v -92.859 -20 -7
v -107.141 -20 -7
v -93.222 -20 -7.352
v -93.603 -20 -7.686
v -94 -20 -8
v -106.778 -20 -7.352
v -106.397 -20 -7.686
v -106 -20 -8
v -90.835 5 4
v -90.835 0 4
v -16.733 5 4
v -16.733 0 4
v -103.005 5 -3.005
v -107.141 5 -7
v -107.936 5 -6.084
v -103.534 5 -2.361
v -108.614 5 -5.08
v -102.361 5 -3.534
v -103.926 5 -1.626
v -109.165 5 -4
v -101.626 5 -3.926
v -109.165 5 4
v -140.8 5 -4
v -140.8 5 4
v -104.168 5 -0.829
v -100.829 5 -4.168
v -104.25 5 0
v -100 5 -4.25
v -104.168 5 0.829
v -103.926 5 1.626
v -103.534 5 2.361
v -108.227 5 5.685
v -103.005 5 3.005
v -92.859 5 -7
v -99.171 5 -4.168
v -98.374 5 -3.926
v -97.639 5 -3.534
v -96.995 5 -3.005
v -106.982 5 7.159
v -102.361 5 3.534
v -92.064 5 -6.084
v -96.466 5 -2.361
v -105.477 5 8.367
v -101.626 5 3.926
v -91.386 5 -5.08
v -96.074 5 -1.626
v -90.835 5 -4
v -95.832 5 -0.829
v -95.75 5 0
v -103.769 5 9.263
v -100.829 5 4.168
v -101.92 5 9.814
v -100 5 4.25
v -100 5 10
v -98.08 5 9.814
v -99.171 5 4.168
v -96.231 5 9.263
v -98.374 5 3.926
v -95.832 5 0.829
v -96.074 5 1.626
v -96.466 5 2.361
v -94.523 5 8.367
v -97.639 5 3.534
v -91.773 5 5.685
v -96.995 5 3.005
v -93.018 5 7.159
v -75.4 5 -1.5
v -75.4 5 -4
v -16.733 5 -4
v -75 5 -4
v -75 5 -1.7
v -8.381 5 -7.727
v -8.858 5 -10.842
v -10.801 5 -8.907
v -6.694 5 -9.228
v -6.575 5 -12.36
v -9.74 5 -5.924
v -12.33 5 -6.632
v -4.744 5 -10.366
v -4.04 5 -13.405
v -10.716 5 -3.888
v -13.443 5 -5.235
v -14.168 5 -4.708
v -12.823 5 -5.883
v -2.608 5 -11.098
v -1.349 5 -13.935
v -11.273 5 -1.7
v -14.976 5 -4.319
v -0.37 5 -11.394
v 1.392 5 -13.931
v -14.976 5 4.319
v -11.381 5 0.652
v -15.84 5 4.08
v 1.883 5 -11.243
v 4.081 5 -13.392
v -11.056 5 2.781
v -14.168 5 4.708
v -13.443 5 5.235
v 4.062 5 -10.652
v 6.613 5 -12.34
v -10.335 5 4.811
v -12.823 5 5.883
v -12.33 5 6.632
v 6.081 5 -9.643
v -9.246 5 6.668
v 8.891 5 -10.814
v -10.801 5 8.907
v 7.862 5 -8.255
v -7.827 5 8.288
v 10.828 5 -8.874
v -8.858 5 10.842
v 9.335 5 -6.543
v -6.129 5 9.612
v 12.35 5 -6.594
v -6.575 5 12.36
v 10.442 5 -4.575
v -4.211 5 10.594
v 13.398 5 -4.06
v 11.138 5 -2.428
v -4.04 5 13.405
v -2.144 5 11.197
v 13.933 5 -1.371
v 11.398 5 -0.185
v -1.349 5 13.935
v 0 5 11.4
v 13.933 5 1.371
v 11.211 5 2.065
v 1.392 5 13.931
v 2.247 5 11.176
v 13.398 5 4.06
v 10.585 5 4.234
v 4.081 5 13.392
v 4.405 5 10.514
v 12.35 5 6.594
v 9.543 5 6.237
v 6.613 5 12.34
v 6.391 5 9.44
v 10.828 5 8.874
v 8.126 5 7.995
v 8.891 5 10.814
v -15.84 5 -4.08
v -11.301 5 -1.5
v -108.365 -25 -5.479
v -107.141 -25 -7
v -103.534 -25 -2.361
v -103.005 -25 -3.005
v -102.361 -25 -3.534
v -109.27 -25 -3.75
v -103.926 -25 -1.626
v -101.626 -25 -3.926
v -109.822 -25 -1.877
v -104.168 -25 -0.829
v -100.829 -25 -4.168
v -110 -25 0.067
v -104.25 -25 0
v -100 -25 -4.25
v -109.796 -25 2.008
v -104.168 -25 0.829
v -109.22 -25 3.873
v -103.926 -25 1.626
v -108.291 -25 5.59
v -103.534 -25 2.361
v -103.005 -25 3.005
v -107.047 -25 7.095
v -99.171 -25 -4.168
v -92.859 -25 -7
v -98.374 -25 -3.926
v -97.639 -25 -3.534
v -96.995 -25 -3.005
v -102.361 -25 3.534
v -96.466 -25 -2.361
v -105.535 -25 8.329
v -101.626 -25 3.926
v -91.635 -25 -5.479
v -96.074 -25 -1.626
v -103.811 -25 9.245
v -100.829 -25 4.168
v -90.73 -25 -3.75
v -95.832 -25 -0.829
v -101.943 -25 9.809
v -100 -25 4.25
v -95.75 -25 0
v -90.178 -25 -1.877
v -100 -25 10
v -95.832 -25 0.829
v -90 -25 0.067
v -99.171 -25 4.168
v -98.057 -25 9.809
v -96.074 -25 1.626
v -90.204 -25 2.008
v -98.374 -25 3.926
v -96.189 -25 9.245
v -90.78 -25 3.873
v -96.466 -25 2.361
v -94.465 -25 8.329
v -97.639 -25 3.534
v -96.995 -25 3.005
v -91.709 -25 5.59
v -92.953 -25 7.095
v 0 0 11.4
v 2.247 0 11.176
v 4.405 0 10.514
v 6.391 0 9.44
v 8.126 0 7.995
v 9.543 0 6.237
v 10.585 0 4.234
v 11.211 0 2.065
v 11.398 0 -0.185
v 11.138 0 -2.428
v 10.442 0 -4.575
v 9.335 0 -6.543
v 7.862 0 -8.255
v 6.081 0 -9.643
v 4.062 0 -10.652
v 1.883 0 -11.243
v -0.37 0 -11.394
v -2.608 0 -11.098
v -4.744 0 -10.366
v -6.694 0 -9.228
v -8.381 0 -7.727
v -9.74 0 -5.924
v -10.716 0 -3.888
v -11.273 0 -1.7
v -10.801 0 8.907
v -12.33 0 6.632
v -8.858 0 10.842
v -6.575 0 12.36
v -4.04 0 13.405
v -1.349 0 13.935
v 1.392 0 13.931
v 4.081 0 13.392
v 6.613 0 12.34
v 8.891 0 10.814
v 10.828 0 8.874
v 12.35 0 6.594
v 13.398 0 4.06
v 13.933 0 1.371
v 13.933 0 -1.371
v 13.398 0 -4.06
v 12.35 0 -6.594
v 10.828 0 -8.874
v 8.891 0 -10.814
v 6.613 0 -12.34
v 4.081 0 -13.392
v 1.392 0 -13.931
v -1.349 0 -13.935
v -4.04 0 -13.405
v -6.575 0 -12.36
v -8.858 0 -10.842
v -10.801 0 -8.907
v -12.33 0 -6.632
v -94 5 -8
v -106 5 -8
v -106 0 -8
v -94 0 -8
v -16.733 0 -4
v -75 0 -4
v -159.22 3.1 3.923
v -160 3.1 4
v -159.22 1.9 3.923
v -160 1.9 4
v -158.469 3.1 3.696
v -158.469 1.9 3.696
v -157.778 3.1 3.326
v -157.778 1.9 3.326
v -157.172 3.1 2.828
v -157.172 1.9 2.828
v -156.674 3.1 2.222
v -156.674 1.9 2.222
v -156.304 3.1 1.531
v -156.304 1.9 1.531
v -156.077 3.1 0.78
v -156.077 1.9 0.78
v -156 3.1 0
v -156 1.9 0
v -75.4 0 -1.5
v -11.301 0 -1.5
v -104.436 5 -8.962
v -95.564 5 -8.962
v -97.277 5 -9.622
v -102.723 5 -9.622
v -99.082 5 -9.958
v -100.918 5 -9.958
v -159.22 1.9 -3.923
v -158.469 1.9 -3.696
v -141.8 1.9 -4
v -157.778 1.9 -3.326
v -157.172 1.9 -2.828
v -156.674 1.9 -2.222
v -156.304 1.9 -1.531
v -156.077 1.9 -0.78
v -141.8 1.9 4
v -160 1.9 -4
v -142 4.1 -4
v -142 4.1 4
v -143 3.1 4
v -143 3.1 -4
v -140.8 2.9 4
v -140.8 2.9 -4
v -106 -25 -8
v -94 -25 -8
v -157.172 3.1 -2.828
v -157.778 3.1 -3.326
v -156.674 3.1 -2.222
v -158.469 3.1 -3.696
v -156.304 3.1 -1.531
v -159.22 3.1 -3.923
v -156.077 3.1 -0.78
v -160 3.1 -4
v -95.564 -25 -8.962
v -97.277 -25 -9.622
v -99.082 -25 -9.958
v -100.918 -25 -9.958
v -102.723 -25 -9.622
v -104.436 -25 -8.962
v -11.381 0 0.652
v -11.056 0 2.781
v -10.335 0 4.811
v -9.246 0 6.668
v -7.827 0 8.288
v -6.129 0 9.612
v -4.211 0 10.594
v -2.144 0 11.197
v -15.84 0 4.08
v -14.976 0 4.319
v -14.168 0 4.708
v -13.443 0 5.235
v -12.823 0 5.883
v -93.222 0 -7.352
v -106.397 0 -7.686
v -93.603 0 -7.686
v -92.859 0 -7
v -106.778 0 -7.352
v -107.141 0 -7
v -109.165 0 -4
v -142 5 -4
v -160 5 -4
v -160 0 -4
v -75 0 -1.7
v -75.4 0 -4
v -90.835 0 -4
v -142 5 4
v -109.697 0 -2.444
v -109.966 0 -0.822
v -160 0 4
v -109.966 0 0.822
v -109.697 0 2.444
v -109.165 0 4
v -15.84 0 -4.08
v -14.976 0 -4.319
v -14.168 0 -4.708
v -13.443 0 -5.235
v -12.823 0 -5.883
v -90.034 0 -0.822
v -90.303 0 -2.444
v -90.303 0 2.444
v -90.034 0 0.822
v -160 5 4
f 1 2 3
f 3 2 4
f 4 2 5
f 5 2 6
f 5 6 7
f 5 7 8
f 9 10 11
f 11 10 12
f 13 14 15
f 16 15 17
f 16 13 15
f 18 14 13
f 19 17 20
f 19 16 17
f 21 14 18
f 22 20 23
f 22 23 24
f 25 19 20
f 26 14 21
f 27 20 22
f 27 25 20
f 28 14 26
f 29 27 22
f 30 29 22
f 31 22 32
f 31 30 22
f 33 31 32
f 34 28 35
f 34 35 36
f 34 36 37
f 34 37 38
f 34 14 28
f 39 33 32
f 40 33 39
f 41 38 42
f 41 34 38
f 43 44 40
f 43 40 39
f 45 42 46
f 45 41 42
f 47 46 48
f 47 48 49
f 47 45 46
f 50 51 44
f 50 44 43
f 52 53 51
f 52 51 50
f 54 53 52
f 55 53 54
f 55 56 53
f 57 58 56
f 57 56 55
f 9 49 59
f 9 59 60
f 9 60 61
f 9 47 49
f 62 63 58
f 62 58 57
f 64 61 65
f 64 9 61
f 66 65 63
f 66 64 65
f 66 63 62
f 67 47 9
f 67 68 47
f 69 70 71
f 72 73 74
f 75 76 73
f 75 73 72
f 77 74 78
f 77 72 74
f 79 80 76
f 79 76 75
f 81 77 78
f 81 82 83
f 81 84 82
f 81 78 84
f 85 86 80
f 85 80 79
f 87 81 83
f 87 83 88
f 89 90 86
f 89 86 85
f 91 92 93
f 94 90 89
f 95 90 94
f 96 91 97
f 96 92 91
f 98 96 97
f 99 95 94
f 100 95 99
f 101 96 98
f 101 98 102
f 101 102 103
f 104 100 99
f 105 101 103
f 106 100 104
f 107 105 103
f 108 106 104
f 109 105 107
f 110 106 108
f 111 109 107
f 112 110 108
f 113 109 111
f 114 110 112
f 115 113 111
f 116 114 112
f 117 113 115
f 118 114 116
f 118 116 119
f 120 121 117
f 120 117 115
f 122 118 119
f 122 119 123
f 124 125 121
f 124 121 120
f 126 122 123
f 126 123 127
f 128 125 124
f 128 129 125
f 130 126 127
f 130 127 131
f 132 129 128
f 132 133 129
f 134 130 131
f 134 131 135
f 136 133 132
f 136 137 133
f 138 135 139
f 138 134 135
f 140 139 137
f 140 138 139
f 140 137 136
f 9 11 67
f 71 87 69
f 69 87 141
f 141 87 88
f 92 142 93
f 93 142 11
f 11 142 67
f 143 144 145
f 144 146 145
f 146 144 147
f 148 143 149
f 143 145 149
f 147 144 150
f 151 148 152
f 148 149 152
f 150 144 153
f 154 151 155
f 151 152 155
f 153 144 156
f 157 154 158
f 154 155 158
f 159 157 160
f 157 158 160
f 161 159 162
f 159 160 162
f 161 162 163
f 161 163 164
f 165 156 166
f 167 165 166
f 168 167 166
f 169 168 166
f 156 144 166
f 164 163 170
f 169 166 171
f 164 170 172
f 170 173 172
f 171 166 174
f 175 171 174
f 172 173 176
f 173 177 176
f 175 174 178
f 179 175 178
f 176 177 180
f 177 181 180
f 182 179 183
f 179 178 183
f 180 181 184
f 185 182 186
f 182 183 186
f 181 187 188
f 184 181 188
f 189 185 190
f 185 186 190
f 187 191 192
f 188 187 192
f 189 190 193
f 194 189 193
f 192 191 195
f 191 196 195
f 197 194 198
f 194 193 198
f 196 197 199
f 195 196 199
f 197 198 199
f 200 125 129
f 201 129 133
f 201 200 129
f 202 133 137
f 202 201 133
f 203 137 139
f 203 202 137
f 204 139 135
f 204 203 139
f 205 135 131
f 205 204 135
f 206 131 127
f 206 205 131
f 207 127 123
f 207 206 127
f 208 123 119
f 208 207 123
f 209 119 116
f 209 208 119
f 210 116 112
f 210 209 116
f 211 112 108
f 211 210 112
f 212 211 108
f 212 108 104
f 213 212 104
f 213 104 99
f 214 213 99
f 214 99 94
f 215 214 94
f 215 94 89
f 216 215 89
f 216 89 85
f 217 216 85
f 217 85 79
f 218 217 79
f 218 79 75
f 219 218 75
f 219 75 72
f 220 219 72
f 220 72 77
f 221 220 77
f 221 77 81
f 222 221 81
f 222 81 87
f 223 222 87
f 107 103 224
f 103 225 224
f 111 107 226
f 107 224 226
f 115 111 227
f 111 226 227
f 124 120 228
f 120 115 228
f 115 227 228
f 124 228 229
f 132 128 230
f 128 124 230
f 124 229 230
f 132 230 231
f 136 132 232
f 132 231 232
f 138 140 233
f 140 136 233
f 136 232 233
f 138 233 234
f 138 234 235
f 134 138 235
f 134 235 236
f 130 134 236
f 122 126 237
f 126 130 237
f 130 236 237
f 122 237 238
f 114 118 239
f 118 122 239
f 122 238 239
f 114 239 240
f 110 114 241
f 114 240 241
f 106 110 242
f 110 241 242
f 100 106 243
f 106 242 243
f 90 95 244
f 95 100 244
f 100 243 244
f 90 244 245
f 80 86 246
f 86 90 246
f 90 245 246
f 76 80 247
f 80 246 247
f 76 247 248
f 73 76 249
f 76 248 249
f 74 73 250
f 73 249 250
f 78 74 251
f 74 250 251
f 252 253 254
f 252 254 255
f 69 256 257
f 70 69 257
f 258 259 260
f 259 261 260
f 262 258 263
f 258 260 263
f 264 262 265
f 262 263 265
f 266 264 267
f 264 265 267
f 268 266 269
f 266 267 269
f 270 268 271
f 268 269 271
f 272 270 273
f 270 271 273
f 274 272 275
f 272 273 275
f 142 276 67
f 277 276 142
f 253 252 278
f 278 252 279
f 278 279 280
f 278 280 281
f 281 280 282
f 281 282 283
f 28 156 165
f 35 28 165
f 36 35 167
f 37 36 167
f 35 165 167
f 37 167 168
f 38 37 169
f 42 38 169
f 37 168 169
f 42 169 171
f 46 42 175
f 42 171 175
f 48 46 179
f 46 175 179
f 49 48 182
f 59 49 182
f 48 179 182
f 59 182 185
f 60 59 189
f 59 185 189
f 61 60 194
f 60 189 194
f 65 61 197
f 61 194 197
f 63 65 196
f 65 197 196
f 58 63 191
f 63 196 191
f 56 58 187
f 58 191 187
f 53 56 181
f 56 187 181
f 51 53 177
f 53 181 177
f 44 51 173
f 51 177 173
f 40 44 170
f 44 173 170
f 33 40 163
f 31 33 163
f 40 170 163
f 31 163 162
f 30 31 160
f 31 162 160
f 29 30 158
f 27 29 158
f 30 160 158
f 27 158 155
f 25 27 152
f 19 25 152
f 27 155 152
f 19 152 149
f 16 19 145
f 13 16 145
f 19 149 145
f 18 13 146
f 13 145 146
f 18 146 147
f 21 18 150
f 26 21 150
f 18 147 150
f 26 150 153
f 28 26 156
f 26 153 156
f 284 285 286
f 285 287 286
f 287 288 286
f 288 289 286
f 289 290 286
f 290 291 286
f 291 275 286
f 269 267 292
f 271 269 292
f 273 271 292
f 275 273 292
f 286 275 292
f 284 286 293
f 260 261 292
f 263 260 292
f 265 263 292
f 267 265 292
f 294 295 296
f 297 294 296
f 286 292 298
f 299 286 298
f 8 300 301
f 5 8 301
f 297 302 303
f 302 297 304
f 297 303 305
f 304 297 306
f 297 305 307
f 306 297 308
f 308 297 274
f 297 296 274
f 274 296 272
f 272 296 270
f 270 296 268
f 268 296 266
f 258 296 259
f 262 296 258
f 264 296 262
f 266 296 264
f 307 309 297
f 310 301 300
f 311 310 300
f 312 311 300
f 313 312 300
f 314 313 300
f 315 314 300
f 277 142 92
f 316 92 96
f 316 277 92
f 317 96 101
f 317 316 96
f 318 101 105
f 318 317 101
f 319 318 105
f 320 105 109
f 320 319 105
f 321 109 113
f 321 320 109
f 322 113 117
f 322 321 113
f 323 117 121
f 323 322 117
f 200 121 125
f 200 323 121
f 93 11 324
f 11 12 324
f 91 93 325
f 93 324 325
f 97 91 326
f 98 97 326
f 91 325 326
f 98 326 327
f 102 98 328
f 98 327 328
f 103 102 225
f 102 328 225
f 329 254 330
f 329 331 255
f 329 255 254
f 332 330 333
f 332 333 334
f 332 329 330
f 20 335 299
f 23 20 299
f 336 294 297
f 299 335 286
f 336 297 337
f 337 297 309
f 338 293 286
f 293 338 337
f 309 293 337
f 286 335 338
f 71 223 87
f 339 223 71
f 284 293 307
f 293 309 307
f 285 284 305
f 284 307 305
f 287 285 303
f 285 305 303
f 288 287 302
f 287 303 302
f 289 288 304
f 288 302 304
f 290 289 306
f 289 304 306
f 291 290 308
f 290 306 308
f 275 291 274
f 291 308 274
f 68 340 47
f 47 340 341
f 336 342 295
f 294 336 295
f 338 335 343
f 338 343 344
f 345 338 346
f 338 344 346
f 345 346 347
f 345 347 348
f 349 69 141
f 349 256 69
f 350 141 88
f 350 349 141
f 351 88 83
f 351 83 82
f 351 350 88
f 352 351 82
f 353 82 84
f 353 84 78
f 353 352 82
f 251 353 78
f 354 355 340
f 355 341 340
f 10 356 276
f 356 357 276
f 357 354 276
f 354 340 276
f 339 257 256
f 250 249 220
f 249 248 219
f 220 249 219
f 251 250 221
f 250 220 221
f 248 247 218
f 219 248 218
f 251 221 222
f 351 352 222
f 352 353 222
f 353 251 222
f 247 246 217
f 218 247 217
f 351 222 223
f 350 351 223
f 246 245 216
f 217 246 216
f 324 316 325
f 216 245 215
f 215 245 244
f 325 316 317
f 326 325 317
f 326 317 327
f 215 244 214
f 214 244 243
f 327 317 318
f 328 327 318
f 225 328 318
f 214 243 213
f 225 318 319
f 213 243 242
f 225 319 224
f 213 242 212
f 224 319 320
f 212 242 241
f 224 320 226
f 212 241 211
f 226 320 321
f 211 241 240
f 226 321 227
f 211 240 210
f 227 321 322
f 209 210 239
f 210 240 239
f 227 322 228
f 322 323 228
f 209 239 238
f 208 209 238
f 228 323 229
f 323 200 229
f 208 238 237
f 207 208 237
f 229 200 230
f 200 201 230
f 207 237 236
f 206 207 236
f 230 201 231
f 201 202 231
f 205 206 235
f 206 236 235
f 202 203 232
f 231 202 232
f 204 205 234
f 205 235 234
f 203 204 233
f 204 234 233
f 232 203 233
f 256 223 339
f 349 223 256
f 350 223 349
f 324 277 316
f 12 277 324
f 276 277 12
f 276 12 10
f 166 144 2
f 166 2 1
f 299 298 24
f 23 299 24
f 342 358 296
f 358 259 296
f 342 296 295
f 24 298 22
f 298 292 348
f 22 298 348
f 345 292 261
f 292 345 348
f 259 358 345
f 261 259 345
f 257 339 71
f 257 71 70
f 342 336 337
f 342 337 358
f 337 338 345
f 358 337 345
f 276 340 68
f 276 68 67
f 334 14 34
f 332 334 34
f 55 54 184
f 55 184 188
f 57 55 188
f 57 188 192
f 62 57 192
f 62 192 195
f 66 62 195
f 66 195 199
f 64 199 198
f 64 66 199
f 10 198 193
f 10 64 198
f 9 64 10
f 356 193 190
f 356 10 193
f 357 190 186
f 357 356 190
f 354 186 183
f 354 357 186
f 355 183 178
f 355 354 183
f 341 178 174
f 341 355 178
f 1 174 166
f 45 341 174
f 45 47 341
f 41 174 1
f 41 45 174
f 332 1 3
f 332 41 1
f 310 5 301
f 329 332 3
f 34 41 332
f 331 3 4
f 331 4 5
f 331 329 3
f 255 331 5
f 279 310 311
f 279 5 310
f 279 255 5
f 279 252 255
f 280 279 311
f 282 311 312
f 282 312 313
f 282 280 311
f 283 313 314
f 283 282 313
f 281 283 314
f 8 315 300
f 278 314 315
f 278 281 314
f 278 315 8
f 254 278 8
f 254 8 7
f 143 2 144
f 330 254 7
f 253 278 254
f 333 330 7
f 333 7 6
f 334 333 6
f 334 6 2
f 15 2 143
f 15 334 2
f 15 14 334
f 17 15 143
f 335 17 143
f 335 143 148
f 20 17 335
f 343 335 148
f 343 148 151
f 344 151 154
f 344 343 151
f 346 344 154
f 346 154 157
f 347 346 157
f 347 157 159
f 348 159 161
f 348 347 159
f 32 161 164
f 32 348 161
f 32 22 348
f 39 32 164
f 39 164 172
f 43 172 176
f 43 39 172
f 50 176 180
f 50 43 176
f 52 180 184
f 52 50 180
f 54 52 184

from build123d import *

# Parameters (mm, degrees)
SKETCH_1_R              = 14
SKETCH_1_R_2            = 11.4
RING_DEPTH              = 5
STICK_DEPTH             = 5
FILLET_1_R              = 5
CORRECTION_HOLE_1_DEPTH = 161.68914089
CUT_EXTRUDE_1_REACH     = 163.087
FILLET_2_R              = 4
SKETCH_10_R             = 10
EXTRUDE_2_DEPTH         = 30
SKETCH_11_R             = 4.25
CUT_EXTRUDE_3_DEPTH     = 30
SKETCH_12_W             = 14.282856858
SKETCH_12_H             = 1
CUT_EXTRUDE_4_DEPTH     = 5
SKETCH_13_W             = 14.282856858
SKETCH_13_H             = 1
CUT_EXTRUDE_6_DEPTH     = 5


with BuildPart() as part:
    # Эскиз1 → ring (new body)
    with BuildSketch(Plane(origin=(0, 0, 0), x_dir=(1, 0, 0), z_dir=(0, 1, 0))):
        with Locations(Location((0, 0, 0), (0, 0, 270))):
            Circle(SKETCH_1_R)
        with Locations(Location((0, 0, 0), (0, 0, 270))):
            Circle(SKETCH_1_R_2, mode=Mode.SUBTRACT)
    extrude(amount=RING_DEPTH)

    # Эскиз2 → stick (add)
    with BuildSketch(Plane(origin=(0, 0, 0), x_dir=(1, 0, 0), z_dir=(0, 1, 0))):
        with BuildLine():
            Line((-10.781929326, 4), (-160, 4))
            Line((-160, 4), (-160, -4))
            Line((-160, -4), (-10.781929326, -4))
            ThreePointArc((-10.781929326, -4), (-11.5, 0), (-10.781929326, 4))
        make_face()
    extrude(amount=STICK_DEPTH)

    # Скругление1
    fillet_1_edges = [part.edges().sort_by_distance(p)[0] for p in [
        (-13.416407865, 2.5, 4),
        (-13.416407865, 2.5, -4),
    ]]
    fillet(fillet_1_edges, radius=FILLET_1_R)

    # Эскиз5 → correction hole 1 (cut, through all)
    with BuildSketch(Plane.XZ):
        Polygon((-75.4, -4), (-75.4, -1.5), (0, -1.5), (0, -1.7), (-75, -1.7), (-75, -4), align=None)
    extrude(amount=-CORRECTION_HOLE_1_DEPTH, mode=Mode.SUBTRACT)

    # Эскиз9 → Вытянуть1 (cut, up to next)
    with BuildSketch(Plane.XY.offset(4), mode=Mode.PRIVATE) as cut_extrude_1_sk1:
        Polygon((-142, 5), (-142, 4.1), (-143, 3.1), (-156, 3.1), (-156, 1.9), (-141.8, 1.9), (-140.8, 2.9), (-140.8, 5), align=None)
    cut_extrude_1_tool1 = extrude(cut_extrude_1_sk1.sketch, amount=-CUT_EXTRUDE_1_REACH, mode=Mode.PRIVATE) & part.part
    add(cut_extrude_1_tool1.solids().sort_by_distance((-147.651462, 2.701462, 4))[0], mode=Mode.SUBTRACT)

    # Скругление2
    fillet_2_edges = [part.edges().sort_by_distance(p)[0] for p in [
        (-156, 2.5, -4),
        (-156, 2.5, 4),
    ]]
    fillet(fillet_2_edges, radius=FILLET_2_R - 0.0001)  # a hair under: the kernel refuses the full size

    # Эскиз10 → Вытянуть2 (add)
    with BuildSketch(Plane(origin=(0, 5, 0), x_dir=(1, 0, 0), z_dir=(0, 1, 0))):
        with Locations(Location((-100, 0, 0), (0, 0, 270))):
            Circle(SKETCH_10_R)
    extrude(amount=-EXTRUDE_2_DEPTH)

    # Эскиз11 → Вытянуть3 (cut)
    with BuildSketch(Plane.XZ.offset(25)):
        with Locations(Location((-100, 0, 0), (0, 0, 270))):
            Circle(SKETCH_11_R)
    extrude(amount=-CUT_EXTRUDE_3_DEPTH, mode=Mode.SUBTRACT)

    # Эскиз12 → Вытянуть4 (cut)
    with BuildSketch(Plane.XZ.offset(25)):
        with Locations((-100, -7.5)):
            Rectangle(SKETCH_12_W, SKETCH_12_H)
    extrude(amount=-CUT_EXTRUDE_4_DEPTH, mode=Mode.SUBTRACT)

    # Эскиз13 → Вытянуть6 (cut)
    with BuildSketch(Plane(origin=(0, 5, 0), x_dir=(1, 0, 0), z_dir=(0, 1, 0))):
        with Locations((-100, 7.5)):
            Rectangle(SKETCH_13_W, SKETCH_13_H)
    extrude(amount=-CUT_EXTRUDE_6_DEPTH, mode=Mode.SUBTRACT)


solid = part.part
